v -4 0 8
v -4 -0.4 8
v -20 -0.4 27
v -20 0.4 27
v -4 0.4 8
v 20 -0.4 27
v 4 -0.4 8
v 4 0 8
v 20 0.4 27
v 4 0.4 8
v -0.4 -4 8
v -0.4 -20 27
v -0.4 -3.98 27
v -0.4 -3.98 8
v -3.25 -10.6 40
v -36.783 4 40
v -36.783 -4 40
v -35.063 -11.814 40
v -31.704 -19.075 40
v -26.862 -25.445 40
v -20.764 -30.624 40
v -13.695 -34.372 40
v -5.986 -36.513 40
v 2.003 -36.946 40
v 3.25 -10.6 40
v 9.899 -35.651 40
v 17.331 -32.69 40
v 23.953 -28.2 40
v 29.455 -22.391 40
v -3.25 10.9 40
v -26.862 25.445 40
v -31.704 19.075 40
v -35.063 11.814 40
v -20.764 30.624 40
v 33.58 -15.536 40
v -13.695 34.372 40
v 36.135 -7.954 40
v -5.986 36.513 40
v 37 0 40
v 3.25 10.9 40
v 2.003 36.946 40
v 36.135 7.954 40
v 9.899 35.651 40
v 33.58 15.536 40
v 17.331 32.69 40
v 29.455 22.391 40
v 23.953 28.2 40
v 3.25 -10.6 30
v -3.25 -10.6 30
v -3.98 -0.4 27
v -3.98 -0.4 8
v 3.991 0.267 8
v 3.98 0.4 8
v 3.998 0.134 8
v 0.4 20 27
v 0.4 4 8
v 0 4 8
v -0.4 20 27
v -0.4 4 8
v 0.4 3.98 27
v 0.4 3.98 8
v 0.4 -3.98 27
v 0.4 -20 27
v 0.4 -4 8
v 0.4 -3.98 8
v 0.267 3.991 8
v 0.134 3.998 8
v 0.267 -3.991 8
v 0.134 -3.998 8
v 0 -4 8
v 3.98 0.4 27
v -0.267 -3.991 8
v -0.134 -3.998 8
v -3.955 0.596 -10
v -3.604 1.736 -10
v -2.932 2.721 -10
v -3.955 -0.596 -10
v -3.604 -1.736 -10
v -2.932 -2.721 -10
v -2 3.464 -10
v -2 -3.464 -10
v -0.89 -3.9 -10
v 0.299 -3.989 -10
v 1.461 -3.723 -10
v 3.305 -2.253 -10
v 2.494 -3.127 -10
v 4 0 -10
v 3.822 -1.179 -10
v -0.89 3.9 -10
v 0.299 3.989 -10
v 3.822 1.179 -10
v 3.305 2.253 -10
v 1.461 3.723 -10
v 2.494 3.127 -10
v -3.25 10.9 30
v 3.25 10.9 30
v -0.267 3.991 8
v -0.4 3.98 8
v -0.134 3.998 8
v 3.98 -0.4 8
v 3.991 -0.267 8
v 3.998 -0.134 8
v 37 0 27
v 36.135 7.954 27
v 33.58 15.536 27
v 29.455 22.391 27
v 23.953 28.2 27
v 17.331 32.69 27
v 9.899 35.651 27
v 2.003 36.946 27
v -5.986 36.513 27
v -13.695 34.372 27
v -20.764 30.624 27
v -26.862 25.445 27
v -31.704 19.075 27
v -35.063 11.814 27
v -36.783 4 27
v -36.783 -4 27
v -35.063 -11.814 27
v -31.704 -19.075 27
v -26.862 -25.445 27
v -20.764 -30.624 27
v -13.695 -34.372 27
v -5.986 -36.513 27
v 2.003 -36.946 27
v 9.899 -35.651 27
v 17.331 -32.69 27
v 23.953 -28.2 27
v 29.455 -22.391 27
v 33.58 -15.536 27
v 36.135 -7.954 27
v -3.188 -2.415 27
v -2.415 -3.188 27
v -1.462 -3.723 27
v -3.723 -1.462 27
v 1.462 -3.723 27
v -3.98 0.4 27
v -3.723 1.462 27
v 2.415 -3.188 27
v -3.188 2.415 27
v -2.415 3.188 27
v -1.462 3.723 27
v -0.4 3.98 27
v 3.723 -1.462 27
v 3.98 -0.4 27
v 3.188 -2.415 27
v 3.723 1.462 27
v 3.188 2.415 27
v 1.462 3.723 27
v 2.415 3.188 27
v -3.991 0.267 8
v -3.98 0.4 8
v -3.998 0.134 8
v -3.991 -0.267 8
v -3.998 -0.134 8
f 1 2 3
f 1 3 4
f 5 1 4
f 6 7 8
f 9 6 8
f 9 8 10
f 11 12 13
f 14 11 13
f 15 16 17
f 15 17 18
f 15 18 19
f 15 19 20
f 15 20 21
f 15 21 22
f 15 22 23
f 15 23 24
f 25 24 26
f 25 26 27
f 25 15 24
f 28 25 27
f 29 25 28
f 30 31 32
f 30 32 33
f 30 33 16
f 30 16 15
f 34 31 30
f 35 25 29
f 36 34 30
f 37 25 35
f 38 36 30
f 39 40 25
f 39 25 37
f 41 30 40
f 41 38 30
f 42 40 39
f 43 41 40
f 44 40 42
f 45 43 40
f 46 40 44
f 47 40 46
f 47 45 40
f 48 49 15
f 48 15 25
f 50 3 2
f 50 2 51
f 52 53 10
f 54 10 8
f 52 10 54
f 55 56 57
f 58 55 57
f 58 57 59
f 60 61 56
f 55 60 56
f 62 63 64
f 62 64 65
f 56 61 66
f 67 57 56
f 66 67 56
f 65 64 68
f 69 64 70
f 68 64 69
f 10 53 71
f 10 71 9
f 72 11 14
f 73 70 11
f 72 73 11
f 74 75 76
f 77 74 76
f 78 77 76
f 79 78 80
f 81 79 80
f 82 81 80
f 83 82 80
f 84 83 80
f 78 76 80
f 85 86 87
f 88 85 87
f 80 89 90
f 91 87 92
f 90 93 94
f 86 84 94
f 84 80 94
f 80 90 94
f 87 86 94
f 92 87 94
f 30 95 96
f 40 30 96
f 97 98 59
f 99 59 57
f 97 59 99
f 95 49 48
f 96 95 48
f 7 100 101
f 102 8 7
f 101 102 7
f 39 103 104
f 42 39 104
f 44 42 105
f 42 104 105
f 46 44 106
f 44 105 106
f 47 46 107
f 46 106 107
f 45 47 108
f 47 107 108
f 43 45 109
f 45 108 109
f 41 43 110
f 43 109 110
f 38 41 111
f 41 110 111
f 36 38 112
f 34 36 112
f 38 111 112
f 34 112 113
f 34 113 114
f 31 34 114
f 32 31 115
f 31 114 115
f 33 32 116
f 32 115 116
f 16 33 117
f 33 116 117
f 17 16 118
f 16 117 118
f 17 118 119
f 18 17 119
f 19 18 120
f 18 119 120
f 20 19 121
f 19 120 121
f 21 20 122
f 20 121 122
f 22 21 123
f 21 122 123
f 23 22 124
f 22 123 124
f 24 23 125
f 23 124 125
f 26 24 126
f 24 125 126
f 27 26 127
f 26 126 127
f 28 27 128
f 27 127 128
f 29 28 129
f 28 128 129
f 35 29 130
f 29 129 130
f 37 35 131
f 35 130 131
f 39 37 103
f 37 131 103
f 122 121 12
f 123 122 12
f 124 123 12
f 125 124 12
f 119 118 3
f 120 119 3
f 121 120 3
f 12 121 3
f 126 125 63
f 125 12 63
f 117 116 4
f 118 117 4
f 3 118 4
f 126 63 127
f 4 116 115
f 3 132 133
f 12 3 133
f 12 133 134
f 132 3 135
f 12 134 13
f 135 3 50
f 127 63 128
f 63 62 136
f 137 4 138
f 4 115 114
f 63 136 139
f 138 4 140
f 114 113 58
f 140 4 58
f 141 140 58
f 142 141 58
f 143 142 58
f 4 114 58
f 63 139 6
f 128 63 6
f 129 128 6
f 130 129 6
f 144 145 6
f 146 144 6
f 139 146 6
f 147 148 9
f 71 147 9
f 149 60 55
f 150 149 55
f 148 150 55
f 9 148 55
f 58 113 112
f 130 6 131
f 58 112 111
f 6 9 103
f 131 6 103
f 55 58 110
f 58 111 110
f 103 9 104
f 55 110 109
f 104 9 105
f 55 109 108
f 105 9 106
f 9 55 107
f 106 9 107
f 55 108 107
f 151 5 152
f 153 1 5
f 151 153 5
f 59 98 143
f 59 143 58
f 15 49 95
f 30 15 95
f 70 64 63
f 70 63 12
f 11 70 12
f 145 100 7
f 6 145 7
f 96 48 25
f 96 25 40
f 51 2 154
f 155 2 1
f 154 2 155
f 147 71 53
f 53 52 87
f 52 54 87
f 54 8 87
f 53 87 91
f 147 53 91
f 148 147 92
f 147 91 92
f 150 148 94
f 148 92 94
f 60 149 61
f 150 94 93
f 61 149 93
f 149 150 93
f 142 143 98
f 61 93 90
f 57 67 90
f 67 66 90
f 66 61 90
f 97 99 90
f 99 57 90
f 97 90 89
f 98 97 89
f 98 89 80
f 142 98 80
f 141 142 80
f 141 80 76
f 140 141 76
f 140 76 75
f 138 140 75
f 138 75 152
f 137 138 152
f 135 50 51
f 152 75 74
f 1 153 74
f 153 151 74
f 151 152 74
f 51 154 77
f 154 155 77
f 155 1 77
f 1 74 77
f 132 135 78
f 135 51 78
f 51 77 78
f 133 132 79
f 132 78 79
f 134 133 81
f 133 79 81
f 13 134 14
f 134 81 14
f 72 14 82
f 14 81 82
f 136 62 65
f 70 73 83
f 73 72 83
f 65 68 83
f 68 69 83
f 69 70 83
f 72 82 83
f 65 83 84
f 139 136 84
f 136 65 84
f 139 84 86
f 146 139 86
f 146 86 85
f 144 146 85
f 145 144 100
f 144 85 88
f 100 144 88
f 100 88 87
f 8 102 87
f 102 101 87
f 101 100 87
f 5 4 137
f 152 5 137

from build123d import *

# Parameters (mm, degrees)
CYLINDER_R                 = 4
CYLINDER_DEPTH             = 40
BOX002_W                   = 40
BOX002_H                   = 0.8
BOX002_DEPTH               = 20
CHAMFER_1_SIZE2            = 16
CHAMFER_1_SIZE             = 19
CHAMFER_2_SIZE2            = 16
CHAMFER_2_SIZE             = 19
BOX003_W                   = 40
BOX003_H                   = 0.8
BOX003_DEPTH               = 20
CHAMFER001_1_SIZE2         = 16
CHAMFER001_1_SIZE          = 19
CHAMFER001_2_SIZE2         = 16
CHAMFER001_2_SIZE          = 19
CHAMFER001_PLACEMENT_ANGLE = 90
BOX001_W                   = 6.5
BOX001_H                   = 21.5
BOX001_DEPTH               = 10
CYLINDER002_R              = 37
CYLINDER002_DEPTH          = 13


with BuildPart() as cilinder:
    # Cylinder → Cylinder (new body)
    with BuildSketch(Plane.XY.offset(-10)):
        Circle(CYLINDER_R)
    extrude(amount=CYLINDER_DEPTH)


with BuildPart() as chamfer_body:
    # Box002 → Box002 (new body)
    with BuildSketch(Plane(origin=(-20, -0.4, 8), x_dir=(1, 0, 0), z_dir=(0, 0, 1))):
        with Locations((20, 0.4)):
            Rectangle(BOX002_W, BOX002_H)
    extrude(amount=BOX002_DEPTH)

    # Chamfer 1
    chamfer_1_edges = [chamfer_body.edges().sort_by_distance(p)[0] for p in [
        (20, 0, 8),
    ]]
    chamfer_1_side = chamfer_body.faces().sort_by_distance((20, 0, 18))[0]
    chamfer(chamfer_1_edges, length=CHAMFER_1_SIZE, length2=CHAMFER_1_SIZE2, reference=chamfer_1_side)

    # Chamfer 2
    chamfer_2_edges = [chamfer_body.edges().sort_by_distance(p)[0] for p in [
        (-20, 0, 8),
    ]]
    chamfer_2_side = chamfer_body.faces().sort_by_distance((-20, 0, 18))[0]
    chamfer(chamfer_2_edges, length=CHAMFER_2_SIZE, length2=CHAMFER_2_SIZE2, reference=chamfer_2_side)


with BuildPart() as chamfer001:
    # Box003 → Box003 (new body)
    with BuildSketch(Plane(origin=(-20, -0.4, 8), x_dir=(1, 0, 0), z_dir=(0, 0, 1))):
        with Locations((20, 0.4)):
            Rectangle(BOX003_W, BOX003_H)
    extrude(amount=BOX003_DEPTH)

    # Chamfer001 1
    chamfer001_1_edges = [chamfer001.edges().sort_by_distance(p)[0] for p in [
        (20, 0, 8),
    ]]
    chamfer001_1_side = chamfer001.faces().sort_by_distance((20, 0, 18))[0]
    chamfer(chamfer001_1_edges, length=CHAMFER001_1_SIZE, length2=CHAMFER001_1_SIZE2, reference=chamfer001_1_side)

    # Chamfer001 2
    chamfer001_2_edges = [chamfer001.edges().sort_by_distance(p)[0] for p in [
        (-20, 0, 8),
    ]]
    chamfer001_2_side = chamfer001.faces().sort_by_distance((-20, 0, 18))[0]
    chamfer(chamfer001_2_edges, length=CHAMFER001_2_SIZE, length2=CHAMFER001_2_SIZE2, reference=chamfer001_2_side)


with BuildPart() as chamfer001_1:
    # Chamfer001 placement: moved
    add(chamfer001.part.rotate(Axis((0, 0, 0), (0, 0, 1)), CHAMFER001_PLACEMENT_ANGLE))


with BuildPart() as kubus001:
    # Box001 → Box001 (new body)
    with BuildSketch(Plane(origin=(-3.25, -10.6, 30), x_dir=(1, 0, 0), z_dir=(0, 0, 1))):
        with Locations((3.25, 10.75)):
            Rectangle(BOX001_W, BOX001_H)
    extrude(amount=BOX001_DEPTH)


with BuildPart() as drijver:
    # Cylinder002 → Cylinder002 (new body)
    with BuildSketch(Plane.XY.offset(27)):
        Circle(CYLINDER002_R)
    extrude(amount=CYLINDER002_DEPTH)

    # Cut: cut Kubus001
    add(kubus001.part, mode=Mode.SUBTRACT)

    # Fusion: union Cilinder, Chamfer body, Chamfer001
    add(cilinder.part)
    add(chamfer_body.part)
    add(chamfer001_1.part)


solid = drijver.part
